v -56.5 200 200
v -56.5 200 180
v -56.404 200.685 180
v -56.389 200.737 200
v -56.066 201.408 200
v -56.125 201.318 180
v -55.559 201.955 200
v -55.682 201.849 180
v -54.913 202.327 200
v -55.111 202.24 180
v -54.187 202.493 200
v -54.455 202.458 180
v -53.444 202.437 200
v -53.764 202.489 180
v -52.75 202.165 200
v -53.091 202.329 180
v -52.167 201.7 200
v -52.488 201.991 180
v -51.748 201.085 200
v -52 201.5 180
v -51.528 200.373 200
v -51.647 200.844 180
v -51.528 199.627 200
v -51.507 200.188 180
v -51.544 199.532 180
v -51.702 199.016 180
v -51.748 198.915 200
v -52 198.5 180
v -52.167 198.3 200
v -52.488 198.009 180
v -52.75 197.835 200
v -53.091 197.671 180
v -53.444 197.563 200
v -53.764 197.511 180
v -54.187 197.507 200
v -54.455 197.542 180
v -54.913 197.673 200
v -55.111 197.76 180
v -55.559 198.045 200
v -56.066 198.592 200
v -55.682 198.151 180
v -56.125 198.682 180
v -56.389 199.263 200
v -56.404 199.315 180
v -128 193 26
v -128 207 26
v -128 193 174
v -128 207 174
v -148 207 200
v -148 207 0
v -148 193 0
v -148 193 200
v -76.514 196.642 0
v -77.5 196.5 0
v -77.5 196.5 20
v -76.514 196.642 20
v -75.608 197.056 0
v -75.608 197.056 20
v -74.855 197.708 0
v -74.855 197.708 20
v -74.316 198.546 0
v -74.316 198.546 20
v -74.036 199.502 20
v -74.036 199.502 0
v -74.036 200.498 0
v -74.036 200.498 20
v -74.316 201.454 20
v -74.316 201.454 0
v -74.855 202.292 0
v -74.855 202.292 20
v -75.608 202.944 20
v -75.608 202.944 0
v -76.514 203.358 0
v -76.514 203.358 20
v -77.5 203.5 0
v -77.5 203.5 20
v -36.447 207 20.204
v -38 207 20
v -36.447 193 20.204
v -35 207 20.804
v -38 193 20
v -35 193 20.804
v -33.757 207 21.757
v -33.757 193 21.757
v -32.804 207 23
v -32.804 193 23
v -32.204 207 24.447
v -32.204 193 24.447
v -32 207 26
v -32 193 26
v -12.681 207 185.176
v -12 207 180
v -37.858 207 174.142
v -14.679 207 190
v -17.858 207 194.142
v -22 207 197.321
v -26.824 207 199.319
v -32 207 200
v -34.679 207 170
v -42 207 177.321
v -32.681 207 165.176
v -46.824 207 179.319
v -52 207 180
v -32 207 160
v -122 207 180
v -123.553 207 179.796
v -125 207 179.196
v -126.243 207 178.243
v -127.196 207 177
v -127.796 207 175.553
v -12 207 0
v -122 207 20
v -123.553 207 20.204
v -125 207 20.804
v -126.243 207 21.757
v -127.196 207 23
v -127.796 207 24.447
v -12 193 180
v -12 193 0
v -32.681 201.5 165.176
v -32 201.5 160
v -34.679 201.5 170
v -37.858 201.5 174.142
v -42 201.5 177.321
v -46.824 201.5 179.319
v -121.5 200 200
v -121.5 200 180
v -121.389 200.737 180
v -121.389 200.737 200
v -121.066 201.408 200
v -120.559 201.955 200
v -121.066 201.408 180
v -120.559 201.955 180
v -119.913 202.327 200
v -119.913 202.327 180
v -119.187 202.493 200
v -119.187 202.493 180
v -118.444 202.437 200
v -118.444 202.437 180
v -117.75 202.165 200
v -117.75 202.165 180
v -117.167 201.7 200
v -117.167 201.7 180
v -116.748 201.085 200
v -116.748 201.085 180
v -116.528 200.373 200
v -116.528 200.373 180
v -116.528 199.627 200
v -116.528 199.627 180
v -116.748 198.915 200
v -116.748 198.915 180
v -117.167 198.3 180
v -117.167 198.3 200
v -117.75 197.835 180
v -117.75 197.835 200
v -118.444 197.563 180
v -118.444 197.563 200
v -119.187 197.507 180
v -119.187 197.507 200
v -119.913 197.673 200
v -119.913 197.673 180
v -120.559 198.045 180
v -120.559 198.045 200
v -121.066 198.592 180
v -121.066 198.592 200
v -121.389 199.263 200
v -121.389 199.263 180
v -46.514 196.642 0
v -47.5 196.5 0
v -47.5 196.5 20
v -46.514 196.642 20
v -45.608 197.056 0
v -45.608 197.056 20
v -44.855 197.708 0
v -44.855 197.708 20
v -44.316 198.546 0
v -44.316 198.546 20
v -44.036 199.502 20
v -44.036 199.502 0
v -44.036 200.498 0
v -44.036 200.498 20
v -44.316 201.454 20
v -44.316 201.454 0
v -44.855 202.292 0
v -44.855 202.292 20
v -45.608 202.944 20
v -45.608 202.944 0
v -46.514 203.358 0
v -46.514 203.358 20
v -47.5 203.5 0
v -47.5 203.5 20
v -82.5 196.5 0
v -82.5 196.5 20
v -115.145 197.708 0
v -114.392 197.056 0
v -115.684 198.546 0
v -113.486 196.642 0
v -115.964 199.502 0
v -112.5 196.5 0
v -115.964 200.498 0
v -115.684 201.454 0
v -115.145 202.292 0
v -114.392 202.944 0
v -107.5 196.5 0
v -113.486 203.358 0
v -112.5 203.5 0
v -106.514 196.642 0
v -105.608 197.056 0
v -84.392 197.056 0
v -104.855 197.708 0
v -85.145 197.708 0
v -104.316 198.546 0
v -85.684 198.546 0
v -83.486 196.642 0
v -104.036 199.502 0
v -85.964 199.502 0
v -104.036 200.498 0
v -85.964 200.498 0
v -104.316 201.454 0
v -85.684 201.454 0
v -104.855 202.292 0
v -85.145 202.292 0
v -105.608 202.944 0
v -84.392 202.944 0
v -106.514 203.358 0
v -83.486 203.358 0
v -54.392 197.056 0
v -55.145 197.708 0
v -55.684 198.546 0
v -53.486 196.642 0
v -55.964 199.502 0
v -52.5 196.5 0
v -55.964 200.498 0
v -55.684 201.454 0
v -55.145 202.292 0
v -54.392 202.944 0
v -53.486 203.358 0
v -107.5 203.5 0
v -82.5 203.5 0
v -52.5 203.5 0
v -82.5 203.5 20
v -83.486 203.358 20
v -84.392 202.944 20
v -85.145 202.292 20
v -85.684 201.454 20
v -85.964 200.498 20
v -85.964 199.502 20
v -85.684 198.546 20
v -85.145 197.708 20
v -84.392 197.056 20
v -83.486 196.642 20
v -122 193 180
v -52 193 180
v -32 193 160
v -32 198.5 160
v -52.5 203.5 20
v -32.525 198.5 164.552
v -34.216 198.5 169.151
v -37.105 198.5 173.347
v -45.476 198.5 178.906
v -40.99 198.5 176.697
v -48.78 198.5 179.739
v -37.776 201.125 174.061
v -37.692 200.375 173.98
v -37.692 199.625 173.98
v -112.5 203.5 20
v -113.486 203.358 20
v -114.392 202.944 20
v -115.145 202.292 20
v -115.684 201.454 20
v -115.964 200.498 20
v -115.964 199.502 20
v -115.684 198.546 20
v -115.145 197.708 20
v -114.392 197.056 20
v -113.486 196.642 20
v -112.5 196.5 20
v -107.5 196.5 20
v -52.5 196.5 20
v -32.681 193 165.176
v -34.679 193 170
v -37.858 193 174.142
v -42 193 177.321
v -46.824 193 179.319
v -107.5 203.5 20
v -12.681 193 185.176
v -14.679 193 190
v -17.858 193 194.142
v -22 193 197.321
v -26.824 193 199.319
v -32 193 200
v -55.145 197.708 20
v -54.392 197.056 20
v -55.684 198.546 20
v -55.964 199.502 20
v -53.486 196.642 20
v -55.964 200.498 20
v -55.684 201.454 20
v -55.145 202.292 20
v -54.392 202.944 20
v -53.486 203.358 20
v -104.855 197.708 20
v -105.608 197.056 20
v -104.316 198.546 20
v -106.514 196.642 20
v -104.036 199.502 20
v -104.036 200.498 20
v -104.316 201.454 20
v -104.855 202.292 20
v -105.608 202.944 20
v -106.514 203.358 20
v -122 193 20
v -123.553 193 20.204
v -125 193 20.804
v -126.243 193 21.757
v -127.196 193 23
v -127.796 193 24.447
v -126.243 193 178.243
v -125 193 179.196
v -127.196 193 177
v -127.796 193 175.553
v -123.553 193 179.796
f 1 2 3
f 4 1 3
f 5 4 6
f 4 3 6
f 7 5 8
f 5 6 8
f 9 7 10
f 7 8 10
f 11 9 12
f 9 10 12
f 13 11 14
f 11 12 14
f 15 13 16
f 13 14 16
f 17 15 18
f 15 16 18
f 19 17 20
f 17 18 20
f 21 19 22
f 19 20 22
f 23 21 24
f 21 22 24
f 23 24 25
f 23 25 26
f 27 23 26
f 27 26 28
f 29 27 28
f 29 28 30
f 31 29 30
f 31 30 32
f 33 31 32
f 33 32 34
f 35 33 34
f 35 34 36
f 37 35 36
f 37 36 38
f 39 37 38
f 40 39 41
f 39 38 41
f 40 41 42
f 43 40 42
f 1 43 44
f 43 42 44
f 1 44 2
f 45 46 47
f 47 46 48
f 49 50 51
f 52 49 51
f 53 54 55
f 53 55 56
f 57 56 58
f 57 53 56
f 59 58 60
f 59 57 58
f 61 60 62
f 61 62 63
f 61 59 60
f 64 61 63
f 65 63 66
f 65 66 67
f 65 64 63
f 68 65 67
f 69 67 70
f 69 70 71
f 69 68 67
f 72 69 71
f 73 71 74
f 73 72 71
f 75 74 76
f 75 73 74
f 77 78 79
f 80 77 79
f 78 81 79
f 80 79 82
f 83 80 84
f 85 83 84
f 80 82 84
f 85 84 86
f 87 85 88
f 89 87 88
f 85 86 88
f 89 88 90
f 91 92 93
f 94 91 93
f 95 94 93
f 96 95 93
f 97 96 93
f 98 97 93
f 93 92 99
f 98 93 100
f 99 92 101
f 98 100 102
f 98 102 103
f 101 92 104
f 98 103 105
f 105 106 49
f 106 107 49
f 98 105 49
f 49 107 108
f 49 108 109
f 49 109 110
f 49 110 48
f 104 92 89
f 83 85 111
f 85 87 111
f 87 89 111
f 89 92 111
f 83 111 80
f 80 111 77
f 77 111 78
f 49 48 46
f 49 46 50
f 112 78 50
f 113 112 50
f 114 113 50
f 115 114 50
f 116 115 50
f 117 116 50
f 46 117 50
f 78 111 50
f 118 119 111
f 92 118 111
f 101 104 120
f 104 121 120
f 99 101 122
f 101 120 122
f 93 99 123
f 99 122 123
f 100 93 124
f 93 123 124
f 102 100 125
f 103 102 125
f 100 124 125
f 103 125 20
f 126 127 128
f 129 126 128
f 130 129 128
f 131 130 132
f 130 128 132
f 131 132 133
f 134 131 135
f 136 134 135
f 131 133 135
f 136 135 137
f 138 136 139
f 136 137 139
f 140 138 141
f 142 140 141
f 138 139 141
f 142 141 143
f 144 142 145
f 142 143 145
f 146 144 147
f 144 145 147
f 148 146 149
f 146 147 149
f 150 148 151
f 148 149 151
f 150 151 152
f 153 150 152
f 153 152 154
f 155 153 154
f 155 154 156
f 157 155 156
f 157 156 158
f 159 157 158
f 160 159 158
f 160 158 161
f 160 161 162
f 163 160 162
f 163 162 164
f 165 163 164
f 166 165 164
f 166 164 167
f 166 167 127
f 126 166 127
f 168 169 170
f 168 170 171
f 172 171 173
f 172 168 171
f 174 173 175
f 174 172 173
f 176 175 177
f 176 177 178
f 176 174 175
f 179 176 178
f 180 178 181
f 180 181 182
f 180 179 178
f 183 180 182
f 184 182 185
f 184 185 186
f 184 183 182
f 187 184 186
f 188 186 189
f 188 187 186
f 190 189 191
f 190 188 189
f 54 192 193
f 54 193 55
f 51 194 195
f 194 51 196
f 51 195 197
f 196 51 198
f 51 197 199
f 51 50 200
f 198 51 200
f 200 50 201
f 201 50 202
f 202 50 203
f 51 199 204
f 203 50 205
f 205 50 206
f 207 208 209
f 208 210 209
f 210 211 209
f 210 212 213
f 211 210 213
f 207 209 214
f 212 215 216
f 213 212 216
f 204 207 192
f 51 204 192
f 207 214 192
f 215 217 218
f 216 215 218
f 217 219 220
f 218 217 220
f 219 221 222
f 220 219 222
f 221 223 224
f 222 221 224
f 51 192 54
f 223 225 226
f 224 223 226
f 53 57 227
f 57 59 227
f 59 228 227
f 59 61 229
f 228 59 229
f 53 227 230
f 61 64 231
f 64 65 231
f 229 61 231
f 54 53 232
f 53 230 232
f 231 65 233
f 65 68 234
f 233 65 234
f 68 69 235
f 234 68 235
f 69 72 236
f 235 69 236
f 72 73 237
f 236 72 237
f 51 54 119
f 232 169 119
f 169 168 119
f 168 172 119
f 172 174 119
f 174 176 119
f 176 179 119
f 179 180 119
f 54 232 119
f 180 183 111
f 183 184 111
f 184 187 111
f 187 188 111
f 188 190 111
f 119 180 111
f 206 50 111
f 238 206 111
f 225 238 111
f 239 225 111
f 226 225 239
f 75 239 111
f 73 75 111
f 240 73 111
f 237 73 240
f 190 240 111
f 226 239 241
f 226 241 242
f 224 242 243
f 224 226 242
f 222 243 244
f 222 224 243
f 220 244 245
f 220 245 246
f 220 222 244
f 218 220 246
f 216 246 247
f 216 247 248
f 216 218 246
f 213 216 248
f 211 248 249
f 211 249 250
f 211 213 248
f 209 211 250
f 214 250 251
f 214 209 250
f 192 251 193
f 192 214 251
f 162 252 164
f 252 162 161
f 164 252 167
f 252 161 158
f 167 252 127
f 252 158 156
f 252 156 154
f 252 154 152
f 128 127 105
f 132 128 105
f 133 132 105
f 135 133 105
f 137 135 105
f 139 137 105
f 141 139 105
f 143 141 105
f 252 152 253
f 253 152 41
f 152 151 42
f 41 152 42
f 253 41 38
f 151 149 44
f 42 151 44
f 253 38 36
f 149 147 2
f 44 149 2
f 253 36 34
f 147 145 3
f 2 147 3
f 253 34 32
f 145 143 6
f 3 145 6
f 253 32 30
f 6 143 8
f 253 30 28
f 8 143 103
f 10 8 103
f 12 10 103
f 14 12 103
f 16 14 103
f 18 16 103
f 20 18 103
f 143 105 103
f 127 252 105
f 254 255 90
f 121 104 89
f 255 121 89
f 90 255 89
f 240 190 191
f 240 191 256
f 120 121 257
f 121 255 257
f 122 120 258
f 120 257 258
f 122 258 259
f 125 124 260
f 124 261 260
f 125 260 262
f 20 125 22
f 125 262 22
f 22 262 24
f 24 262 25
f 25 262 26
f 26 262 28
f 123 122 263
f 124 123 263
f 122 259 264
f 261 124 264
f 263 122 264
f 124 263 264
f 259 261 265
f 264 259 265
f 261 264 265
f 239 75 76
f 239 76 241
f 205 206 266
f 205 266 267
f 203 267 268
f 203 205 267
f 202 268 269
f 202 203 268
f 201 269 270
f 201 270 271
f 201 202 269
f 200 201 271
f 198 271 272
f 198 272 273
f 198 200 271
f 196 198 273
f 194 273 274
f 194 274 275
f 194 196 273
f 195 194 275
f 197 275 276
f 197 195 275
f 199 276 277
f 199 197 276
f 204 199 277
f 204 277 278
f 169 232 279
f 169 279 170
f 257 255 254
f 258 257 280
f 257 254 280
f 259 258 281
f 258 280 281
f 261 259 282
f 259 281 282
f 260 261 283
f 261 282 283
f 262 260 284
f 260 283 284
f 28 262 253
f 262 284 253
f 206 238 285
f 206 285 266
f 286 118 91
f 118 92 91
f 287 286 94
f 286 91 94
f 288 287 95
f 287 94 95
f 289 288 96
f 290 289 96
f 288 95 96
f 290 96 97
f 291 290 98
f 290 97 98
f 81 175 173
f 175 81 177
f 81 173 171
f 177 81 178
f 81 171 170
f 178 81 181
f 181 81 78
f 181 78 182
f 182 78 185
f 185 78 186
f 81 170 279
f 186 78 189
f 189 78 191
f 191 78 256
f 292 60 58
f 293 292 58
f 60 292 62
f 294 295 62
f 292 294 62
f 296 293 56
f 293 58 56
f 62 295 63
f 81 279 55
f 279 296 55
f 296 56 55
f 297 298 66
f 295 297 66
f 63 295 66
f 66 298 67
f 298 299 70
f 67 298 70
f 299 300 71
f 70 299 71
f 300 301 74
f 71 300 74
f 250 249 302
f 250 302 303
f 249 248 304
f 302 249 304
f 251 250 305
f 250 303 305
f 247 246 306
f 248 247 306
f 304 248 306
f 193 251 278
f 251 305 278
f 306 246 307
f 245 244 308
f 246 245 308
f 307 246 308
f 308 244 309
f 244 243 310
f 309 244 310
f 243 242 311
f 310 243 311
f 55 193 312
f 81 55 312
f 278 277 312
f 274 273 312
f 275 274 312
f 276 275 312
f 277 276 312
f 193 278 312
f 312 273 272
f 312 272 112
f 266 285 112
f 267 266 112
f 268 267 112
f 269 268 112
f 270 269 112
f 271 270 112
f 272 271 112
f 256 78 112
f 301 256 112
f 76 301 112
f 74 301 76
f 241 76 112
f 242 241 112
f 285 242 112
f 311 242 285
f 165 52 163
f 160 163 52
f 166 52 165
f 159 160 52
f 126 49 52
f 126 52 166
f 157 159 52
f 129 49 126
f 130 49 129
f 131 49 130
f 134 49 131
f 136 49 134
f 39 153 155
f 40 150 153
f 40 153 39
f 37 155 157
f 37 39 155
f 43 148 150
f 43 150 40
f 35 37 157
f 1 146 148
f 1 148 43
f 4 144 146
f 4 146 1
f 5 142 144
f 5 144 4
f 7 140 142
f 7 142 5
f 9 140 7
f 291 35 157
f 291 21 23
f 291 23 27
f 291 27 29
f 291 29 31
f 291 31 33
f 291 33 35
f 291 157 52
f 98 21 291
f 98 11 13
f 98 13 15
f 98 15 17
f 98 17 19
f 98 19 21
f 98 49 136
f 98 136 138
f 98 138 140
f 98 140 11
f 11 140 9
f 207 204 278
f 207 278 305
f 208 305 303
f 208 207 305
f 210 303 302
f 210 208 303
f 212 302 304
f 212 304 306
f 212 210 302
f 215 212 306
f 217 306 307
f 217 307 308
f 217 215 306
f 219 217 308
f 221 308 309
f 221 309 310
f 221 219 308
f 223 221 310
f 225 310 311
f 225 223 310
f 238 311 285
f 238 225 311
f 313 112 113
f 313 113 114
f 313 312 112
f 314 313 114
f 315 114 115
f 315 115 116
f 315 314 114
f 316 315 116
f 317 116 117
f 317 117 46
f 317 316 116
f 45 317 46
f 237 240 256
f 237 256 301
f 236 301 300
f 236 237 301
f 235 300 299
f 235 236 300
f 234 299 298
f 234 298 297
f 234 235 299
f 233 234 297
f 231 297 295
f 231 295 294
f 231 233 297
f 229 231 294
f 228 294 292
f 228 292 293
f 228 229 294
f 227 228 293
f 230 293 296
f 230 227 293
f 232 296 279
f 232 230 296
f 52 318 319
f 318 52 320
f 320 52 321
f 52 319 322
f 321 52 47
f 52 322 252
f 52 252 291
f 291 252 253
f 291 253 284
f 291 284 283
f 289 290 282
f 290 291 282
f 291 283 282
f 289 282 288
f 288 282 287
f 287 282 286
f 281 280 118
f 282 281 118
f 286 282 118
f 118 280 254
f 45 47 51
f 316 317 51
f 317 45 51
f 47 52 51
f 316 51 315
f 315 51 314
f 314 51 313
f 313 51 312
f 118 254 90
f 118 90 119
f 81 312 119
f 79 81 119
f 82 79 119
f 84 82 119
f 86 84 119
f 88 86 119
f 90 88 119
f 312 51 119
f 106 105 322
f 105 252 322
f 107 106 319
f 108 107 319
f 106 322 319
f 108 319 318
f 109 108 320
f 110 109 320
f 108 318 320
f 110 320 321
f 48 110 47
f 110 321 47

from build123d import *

# Parameters (mm, degrees)
BOSS_EXTRUDE1_DEPTH       = 200
CUT_EXTRUDE1_DEPTH        = 250.198715888
F_6_0MM_DOWEL_SLOT1_DEPTH = 20
M6X1_0_TAPPED_HOLE1_D     = 5
M6X1_0_TAPPED_HOLE1_DEPTH = 21.497848452
M6X1_0_TAPPED_HOLE1_TIP   = 1.502151548
FILLET1_R                 = 6
FILLET2_R                 = 20


# Read off the part's stored shape, not the designer's step: Ø6.0mm Dowel Slot1
with BuildPart() as part:
    # Sketch1 → Boss-Extrude1 (new body)
    with BuildSketch(Plane.XY):
        Polygon((-21, 207), (-148, 207), (-148, 197.5), (-148, 193), (-24, 193), (-12, 193), (-12, 207), align=None)
    extrude(amount=BOSS_EXTRUDE1_DEPTH)

    # Sketch3 → Cut-Extrude1 (cut, through all)
    with BuildSketch(Plane(origin=(0, 207, 0), x_dir=(1, 0, 0), z_dir=(0, 1, 0))):
        Polygon((-128, -20), (-128, -30), (-128, -108), (-128, -180), (-118, -180), (-54, -180), (-32, -180), (-32, -20), align=None)
    extrude(amount=-CUT_EXTRUDE1_DEPTH, mode=Mode.SUBTRACT)

    # Ø6.0mm Dowel Slot1 outline → Ø6.0mm Dowel Slot1 (cut)
    with BuildSketch(Plane.XY):
        with BuildLine():
            Line((-52.5, 196.5), (-47.5, 196.5))
            ThreePointArc((-47.5, 196.5), (-44, 200), (-47.5, 203.5))
            Line((-47.5, 203.5), (-52.5, 203.5))
            ThreePointArc((-52.5, 203.5), (-56, 200), (-52.5, 196.5))
        make_face()
        with BuildLine():
            ThreePointArc((-77.5, 196.5), (-74, 200), (-77.5, 203.5))
            Line((-77.5, 203.5), (-82.5, 203.5))
            ThreePointArc((-82.5, 203.5), (-86, 200), (-82.5, 196.5))
            Line((-82.5, 196.5), (-77.5, 196.5))
        make_face()
        with BuildLine():
            ThreePointArc((-107.5, 196.5), (-104, 200), (-107.5, 203.5))
            Line((-107.5, 203.5), (-112.5, 203.5))
            ThreePointArc((-112.5, 203.5), (-116, 200), (-112.5, 196.5))
            Line((-112.5, 196.5), (-107.5, 196.5))
        make_face()
    extrude(amount=F_6_0MM_DOWEL_SLOT1_DEPTH, mode=Mode.SUBTRACT)

    # M6x1.0 Tapped Hole1
    with Locations(Plane.XY.offset(200)):
        with Locations((-119, 200), (-54, 200)):
            Hole(M6X1_0_TAPPED_HOLE1_D / 2, depth=M6X1_0_TAPPED_HOLE1_DEPTH)
            with Locations((0, 0, -(M6X1_0_TAPPED_HOLE1_DEPTH + M6X1_0_TAPPED_HOLE1_TIP / 2))):  # 118° drill point
                Cone(0, M6X1_0_TAPPED_HOLE1_D / 2, M6X1_0_TAPPED_HOLE1_TIP, mode=Mode.SUBTRACT)

    # Fillet1
    fillet1_edges = [part.edges().sort_by_distance(p)[0] for p in [
        (-128, 200, 180),
        (-128, 200, 20),
        (-32, 200, 20),
    ]]
    fillet(fillet1_edges, radius=FILLET1_R)

    # Fillet2
    fillet2_edges = [part.edges().sort_by_distance(p)[0] for p in [
        (-12, 200, 200),
        (-32, 200, 180),
    ]]
    fillet(fillet2_edges, radius=FILLET2_R)


solid = part.part
